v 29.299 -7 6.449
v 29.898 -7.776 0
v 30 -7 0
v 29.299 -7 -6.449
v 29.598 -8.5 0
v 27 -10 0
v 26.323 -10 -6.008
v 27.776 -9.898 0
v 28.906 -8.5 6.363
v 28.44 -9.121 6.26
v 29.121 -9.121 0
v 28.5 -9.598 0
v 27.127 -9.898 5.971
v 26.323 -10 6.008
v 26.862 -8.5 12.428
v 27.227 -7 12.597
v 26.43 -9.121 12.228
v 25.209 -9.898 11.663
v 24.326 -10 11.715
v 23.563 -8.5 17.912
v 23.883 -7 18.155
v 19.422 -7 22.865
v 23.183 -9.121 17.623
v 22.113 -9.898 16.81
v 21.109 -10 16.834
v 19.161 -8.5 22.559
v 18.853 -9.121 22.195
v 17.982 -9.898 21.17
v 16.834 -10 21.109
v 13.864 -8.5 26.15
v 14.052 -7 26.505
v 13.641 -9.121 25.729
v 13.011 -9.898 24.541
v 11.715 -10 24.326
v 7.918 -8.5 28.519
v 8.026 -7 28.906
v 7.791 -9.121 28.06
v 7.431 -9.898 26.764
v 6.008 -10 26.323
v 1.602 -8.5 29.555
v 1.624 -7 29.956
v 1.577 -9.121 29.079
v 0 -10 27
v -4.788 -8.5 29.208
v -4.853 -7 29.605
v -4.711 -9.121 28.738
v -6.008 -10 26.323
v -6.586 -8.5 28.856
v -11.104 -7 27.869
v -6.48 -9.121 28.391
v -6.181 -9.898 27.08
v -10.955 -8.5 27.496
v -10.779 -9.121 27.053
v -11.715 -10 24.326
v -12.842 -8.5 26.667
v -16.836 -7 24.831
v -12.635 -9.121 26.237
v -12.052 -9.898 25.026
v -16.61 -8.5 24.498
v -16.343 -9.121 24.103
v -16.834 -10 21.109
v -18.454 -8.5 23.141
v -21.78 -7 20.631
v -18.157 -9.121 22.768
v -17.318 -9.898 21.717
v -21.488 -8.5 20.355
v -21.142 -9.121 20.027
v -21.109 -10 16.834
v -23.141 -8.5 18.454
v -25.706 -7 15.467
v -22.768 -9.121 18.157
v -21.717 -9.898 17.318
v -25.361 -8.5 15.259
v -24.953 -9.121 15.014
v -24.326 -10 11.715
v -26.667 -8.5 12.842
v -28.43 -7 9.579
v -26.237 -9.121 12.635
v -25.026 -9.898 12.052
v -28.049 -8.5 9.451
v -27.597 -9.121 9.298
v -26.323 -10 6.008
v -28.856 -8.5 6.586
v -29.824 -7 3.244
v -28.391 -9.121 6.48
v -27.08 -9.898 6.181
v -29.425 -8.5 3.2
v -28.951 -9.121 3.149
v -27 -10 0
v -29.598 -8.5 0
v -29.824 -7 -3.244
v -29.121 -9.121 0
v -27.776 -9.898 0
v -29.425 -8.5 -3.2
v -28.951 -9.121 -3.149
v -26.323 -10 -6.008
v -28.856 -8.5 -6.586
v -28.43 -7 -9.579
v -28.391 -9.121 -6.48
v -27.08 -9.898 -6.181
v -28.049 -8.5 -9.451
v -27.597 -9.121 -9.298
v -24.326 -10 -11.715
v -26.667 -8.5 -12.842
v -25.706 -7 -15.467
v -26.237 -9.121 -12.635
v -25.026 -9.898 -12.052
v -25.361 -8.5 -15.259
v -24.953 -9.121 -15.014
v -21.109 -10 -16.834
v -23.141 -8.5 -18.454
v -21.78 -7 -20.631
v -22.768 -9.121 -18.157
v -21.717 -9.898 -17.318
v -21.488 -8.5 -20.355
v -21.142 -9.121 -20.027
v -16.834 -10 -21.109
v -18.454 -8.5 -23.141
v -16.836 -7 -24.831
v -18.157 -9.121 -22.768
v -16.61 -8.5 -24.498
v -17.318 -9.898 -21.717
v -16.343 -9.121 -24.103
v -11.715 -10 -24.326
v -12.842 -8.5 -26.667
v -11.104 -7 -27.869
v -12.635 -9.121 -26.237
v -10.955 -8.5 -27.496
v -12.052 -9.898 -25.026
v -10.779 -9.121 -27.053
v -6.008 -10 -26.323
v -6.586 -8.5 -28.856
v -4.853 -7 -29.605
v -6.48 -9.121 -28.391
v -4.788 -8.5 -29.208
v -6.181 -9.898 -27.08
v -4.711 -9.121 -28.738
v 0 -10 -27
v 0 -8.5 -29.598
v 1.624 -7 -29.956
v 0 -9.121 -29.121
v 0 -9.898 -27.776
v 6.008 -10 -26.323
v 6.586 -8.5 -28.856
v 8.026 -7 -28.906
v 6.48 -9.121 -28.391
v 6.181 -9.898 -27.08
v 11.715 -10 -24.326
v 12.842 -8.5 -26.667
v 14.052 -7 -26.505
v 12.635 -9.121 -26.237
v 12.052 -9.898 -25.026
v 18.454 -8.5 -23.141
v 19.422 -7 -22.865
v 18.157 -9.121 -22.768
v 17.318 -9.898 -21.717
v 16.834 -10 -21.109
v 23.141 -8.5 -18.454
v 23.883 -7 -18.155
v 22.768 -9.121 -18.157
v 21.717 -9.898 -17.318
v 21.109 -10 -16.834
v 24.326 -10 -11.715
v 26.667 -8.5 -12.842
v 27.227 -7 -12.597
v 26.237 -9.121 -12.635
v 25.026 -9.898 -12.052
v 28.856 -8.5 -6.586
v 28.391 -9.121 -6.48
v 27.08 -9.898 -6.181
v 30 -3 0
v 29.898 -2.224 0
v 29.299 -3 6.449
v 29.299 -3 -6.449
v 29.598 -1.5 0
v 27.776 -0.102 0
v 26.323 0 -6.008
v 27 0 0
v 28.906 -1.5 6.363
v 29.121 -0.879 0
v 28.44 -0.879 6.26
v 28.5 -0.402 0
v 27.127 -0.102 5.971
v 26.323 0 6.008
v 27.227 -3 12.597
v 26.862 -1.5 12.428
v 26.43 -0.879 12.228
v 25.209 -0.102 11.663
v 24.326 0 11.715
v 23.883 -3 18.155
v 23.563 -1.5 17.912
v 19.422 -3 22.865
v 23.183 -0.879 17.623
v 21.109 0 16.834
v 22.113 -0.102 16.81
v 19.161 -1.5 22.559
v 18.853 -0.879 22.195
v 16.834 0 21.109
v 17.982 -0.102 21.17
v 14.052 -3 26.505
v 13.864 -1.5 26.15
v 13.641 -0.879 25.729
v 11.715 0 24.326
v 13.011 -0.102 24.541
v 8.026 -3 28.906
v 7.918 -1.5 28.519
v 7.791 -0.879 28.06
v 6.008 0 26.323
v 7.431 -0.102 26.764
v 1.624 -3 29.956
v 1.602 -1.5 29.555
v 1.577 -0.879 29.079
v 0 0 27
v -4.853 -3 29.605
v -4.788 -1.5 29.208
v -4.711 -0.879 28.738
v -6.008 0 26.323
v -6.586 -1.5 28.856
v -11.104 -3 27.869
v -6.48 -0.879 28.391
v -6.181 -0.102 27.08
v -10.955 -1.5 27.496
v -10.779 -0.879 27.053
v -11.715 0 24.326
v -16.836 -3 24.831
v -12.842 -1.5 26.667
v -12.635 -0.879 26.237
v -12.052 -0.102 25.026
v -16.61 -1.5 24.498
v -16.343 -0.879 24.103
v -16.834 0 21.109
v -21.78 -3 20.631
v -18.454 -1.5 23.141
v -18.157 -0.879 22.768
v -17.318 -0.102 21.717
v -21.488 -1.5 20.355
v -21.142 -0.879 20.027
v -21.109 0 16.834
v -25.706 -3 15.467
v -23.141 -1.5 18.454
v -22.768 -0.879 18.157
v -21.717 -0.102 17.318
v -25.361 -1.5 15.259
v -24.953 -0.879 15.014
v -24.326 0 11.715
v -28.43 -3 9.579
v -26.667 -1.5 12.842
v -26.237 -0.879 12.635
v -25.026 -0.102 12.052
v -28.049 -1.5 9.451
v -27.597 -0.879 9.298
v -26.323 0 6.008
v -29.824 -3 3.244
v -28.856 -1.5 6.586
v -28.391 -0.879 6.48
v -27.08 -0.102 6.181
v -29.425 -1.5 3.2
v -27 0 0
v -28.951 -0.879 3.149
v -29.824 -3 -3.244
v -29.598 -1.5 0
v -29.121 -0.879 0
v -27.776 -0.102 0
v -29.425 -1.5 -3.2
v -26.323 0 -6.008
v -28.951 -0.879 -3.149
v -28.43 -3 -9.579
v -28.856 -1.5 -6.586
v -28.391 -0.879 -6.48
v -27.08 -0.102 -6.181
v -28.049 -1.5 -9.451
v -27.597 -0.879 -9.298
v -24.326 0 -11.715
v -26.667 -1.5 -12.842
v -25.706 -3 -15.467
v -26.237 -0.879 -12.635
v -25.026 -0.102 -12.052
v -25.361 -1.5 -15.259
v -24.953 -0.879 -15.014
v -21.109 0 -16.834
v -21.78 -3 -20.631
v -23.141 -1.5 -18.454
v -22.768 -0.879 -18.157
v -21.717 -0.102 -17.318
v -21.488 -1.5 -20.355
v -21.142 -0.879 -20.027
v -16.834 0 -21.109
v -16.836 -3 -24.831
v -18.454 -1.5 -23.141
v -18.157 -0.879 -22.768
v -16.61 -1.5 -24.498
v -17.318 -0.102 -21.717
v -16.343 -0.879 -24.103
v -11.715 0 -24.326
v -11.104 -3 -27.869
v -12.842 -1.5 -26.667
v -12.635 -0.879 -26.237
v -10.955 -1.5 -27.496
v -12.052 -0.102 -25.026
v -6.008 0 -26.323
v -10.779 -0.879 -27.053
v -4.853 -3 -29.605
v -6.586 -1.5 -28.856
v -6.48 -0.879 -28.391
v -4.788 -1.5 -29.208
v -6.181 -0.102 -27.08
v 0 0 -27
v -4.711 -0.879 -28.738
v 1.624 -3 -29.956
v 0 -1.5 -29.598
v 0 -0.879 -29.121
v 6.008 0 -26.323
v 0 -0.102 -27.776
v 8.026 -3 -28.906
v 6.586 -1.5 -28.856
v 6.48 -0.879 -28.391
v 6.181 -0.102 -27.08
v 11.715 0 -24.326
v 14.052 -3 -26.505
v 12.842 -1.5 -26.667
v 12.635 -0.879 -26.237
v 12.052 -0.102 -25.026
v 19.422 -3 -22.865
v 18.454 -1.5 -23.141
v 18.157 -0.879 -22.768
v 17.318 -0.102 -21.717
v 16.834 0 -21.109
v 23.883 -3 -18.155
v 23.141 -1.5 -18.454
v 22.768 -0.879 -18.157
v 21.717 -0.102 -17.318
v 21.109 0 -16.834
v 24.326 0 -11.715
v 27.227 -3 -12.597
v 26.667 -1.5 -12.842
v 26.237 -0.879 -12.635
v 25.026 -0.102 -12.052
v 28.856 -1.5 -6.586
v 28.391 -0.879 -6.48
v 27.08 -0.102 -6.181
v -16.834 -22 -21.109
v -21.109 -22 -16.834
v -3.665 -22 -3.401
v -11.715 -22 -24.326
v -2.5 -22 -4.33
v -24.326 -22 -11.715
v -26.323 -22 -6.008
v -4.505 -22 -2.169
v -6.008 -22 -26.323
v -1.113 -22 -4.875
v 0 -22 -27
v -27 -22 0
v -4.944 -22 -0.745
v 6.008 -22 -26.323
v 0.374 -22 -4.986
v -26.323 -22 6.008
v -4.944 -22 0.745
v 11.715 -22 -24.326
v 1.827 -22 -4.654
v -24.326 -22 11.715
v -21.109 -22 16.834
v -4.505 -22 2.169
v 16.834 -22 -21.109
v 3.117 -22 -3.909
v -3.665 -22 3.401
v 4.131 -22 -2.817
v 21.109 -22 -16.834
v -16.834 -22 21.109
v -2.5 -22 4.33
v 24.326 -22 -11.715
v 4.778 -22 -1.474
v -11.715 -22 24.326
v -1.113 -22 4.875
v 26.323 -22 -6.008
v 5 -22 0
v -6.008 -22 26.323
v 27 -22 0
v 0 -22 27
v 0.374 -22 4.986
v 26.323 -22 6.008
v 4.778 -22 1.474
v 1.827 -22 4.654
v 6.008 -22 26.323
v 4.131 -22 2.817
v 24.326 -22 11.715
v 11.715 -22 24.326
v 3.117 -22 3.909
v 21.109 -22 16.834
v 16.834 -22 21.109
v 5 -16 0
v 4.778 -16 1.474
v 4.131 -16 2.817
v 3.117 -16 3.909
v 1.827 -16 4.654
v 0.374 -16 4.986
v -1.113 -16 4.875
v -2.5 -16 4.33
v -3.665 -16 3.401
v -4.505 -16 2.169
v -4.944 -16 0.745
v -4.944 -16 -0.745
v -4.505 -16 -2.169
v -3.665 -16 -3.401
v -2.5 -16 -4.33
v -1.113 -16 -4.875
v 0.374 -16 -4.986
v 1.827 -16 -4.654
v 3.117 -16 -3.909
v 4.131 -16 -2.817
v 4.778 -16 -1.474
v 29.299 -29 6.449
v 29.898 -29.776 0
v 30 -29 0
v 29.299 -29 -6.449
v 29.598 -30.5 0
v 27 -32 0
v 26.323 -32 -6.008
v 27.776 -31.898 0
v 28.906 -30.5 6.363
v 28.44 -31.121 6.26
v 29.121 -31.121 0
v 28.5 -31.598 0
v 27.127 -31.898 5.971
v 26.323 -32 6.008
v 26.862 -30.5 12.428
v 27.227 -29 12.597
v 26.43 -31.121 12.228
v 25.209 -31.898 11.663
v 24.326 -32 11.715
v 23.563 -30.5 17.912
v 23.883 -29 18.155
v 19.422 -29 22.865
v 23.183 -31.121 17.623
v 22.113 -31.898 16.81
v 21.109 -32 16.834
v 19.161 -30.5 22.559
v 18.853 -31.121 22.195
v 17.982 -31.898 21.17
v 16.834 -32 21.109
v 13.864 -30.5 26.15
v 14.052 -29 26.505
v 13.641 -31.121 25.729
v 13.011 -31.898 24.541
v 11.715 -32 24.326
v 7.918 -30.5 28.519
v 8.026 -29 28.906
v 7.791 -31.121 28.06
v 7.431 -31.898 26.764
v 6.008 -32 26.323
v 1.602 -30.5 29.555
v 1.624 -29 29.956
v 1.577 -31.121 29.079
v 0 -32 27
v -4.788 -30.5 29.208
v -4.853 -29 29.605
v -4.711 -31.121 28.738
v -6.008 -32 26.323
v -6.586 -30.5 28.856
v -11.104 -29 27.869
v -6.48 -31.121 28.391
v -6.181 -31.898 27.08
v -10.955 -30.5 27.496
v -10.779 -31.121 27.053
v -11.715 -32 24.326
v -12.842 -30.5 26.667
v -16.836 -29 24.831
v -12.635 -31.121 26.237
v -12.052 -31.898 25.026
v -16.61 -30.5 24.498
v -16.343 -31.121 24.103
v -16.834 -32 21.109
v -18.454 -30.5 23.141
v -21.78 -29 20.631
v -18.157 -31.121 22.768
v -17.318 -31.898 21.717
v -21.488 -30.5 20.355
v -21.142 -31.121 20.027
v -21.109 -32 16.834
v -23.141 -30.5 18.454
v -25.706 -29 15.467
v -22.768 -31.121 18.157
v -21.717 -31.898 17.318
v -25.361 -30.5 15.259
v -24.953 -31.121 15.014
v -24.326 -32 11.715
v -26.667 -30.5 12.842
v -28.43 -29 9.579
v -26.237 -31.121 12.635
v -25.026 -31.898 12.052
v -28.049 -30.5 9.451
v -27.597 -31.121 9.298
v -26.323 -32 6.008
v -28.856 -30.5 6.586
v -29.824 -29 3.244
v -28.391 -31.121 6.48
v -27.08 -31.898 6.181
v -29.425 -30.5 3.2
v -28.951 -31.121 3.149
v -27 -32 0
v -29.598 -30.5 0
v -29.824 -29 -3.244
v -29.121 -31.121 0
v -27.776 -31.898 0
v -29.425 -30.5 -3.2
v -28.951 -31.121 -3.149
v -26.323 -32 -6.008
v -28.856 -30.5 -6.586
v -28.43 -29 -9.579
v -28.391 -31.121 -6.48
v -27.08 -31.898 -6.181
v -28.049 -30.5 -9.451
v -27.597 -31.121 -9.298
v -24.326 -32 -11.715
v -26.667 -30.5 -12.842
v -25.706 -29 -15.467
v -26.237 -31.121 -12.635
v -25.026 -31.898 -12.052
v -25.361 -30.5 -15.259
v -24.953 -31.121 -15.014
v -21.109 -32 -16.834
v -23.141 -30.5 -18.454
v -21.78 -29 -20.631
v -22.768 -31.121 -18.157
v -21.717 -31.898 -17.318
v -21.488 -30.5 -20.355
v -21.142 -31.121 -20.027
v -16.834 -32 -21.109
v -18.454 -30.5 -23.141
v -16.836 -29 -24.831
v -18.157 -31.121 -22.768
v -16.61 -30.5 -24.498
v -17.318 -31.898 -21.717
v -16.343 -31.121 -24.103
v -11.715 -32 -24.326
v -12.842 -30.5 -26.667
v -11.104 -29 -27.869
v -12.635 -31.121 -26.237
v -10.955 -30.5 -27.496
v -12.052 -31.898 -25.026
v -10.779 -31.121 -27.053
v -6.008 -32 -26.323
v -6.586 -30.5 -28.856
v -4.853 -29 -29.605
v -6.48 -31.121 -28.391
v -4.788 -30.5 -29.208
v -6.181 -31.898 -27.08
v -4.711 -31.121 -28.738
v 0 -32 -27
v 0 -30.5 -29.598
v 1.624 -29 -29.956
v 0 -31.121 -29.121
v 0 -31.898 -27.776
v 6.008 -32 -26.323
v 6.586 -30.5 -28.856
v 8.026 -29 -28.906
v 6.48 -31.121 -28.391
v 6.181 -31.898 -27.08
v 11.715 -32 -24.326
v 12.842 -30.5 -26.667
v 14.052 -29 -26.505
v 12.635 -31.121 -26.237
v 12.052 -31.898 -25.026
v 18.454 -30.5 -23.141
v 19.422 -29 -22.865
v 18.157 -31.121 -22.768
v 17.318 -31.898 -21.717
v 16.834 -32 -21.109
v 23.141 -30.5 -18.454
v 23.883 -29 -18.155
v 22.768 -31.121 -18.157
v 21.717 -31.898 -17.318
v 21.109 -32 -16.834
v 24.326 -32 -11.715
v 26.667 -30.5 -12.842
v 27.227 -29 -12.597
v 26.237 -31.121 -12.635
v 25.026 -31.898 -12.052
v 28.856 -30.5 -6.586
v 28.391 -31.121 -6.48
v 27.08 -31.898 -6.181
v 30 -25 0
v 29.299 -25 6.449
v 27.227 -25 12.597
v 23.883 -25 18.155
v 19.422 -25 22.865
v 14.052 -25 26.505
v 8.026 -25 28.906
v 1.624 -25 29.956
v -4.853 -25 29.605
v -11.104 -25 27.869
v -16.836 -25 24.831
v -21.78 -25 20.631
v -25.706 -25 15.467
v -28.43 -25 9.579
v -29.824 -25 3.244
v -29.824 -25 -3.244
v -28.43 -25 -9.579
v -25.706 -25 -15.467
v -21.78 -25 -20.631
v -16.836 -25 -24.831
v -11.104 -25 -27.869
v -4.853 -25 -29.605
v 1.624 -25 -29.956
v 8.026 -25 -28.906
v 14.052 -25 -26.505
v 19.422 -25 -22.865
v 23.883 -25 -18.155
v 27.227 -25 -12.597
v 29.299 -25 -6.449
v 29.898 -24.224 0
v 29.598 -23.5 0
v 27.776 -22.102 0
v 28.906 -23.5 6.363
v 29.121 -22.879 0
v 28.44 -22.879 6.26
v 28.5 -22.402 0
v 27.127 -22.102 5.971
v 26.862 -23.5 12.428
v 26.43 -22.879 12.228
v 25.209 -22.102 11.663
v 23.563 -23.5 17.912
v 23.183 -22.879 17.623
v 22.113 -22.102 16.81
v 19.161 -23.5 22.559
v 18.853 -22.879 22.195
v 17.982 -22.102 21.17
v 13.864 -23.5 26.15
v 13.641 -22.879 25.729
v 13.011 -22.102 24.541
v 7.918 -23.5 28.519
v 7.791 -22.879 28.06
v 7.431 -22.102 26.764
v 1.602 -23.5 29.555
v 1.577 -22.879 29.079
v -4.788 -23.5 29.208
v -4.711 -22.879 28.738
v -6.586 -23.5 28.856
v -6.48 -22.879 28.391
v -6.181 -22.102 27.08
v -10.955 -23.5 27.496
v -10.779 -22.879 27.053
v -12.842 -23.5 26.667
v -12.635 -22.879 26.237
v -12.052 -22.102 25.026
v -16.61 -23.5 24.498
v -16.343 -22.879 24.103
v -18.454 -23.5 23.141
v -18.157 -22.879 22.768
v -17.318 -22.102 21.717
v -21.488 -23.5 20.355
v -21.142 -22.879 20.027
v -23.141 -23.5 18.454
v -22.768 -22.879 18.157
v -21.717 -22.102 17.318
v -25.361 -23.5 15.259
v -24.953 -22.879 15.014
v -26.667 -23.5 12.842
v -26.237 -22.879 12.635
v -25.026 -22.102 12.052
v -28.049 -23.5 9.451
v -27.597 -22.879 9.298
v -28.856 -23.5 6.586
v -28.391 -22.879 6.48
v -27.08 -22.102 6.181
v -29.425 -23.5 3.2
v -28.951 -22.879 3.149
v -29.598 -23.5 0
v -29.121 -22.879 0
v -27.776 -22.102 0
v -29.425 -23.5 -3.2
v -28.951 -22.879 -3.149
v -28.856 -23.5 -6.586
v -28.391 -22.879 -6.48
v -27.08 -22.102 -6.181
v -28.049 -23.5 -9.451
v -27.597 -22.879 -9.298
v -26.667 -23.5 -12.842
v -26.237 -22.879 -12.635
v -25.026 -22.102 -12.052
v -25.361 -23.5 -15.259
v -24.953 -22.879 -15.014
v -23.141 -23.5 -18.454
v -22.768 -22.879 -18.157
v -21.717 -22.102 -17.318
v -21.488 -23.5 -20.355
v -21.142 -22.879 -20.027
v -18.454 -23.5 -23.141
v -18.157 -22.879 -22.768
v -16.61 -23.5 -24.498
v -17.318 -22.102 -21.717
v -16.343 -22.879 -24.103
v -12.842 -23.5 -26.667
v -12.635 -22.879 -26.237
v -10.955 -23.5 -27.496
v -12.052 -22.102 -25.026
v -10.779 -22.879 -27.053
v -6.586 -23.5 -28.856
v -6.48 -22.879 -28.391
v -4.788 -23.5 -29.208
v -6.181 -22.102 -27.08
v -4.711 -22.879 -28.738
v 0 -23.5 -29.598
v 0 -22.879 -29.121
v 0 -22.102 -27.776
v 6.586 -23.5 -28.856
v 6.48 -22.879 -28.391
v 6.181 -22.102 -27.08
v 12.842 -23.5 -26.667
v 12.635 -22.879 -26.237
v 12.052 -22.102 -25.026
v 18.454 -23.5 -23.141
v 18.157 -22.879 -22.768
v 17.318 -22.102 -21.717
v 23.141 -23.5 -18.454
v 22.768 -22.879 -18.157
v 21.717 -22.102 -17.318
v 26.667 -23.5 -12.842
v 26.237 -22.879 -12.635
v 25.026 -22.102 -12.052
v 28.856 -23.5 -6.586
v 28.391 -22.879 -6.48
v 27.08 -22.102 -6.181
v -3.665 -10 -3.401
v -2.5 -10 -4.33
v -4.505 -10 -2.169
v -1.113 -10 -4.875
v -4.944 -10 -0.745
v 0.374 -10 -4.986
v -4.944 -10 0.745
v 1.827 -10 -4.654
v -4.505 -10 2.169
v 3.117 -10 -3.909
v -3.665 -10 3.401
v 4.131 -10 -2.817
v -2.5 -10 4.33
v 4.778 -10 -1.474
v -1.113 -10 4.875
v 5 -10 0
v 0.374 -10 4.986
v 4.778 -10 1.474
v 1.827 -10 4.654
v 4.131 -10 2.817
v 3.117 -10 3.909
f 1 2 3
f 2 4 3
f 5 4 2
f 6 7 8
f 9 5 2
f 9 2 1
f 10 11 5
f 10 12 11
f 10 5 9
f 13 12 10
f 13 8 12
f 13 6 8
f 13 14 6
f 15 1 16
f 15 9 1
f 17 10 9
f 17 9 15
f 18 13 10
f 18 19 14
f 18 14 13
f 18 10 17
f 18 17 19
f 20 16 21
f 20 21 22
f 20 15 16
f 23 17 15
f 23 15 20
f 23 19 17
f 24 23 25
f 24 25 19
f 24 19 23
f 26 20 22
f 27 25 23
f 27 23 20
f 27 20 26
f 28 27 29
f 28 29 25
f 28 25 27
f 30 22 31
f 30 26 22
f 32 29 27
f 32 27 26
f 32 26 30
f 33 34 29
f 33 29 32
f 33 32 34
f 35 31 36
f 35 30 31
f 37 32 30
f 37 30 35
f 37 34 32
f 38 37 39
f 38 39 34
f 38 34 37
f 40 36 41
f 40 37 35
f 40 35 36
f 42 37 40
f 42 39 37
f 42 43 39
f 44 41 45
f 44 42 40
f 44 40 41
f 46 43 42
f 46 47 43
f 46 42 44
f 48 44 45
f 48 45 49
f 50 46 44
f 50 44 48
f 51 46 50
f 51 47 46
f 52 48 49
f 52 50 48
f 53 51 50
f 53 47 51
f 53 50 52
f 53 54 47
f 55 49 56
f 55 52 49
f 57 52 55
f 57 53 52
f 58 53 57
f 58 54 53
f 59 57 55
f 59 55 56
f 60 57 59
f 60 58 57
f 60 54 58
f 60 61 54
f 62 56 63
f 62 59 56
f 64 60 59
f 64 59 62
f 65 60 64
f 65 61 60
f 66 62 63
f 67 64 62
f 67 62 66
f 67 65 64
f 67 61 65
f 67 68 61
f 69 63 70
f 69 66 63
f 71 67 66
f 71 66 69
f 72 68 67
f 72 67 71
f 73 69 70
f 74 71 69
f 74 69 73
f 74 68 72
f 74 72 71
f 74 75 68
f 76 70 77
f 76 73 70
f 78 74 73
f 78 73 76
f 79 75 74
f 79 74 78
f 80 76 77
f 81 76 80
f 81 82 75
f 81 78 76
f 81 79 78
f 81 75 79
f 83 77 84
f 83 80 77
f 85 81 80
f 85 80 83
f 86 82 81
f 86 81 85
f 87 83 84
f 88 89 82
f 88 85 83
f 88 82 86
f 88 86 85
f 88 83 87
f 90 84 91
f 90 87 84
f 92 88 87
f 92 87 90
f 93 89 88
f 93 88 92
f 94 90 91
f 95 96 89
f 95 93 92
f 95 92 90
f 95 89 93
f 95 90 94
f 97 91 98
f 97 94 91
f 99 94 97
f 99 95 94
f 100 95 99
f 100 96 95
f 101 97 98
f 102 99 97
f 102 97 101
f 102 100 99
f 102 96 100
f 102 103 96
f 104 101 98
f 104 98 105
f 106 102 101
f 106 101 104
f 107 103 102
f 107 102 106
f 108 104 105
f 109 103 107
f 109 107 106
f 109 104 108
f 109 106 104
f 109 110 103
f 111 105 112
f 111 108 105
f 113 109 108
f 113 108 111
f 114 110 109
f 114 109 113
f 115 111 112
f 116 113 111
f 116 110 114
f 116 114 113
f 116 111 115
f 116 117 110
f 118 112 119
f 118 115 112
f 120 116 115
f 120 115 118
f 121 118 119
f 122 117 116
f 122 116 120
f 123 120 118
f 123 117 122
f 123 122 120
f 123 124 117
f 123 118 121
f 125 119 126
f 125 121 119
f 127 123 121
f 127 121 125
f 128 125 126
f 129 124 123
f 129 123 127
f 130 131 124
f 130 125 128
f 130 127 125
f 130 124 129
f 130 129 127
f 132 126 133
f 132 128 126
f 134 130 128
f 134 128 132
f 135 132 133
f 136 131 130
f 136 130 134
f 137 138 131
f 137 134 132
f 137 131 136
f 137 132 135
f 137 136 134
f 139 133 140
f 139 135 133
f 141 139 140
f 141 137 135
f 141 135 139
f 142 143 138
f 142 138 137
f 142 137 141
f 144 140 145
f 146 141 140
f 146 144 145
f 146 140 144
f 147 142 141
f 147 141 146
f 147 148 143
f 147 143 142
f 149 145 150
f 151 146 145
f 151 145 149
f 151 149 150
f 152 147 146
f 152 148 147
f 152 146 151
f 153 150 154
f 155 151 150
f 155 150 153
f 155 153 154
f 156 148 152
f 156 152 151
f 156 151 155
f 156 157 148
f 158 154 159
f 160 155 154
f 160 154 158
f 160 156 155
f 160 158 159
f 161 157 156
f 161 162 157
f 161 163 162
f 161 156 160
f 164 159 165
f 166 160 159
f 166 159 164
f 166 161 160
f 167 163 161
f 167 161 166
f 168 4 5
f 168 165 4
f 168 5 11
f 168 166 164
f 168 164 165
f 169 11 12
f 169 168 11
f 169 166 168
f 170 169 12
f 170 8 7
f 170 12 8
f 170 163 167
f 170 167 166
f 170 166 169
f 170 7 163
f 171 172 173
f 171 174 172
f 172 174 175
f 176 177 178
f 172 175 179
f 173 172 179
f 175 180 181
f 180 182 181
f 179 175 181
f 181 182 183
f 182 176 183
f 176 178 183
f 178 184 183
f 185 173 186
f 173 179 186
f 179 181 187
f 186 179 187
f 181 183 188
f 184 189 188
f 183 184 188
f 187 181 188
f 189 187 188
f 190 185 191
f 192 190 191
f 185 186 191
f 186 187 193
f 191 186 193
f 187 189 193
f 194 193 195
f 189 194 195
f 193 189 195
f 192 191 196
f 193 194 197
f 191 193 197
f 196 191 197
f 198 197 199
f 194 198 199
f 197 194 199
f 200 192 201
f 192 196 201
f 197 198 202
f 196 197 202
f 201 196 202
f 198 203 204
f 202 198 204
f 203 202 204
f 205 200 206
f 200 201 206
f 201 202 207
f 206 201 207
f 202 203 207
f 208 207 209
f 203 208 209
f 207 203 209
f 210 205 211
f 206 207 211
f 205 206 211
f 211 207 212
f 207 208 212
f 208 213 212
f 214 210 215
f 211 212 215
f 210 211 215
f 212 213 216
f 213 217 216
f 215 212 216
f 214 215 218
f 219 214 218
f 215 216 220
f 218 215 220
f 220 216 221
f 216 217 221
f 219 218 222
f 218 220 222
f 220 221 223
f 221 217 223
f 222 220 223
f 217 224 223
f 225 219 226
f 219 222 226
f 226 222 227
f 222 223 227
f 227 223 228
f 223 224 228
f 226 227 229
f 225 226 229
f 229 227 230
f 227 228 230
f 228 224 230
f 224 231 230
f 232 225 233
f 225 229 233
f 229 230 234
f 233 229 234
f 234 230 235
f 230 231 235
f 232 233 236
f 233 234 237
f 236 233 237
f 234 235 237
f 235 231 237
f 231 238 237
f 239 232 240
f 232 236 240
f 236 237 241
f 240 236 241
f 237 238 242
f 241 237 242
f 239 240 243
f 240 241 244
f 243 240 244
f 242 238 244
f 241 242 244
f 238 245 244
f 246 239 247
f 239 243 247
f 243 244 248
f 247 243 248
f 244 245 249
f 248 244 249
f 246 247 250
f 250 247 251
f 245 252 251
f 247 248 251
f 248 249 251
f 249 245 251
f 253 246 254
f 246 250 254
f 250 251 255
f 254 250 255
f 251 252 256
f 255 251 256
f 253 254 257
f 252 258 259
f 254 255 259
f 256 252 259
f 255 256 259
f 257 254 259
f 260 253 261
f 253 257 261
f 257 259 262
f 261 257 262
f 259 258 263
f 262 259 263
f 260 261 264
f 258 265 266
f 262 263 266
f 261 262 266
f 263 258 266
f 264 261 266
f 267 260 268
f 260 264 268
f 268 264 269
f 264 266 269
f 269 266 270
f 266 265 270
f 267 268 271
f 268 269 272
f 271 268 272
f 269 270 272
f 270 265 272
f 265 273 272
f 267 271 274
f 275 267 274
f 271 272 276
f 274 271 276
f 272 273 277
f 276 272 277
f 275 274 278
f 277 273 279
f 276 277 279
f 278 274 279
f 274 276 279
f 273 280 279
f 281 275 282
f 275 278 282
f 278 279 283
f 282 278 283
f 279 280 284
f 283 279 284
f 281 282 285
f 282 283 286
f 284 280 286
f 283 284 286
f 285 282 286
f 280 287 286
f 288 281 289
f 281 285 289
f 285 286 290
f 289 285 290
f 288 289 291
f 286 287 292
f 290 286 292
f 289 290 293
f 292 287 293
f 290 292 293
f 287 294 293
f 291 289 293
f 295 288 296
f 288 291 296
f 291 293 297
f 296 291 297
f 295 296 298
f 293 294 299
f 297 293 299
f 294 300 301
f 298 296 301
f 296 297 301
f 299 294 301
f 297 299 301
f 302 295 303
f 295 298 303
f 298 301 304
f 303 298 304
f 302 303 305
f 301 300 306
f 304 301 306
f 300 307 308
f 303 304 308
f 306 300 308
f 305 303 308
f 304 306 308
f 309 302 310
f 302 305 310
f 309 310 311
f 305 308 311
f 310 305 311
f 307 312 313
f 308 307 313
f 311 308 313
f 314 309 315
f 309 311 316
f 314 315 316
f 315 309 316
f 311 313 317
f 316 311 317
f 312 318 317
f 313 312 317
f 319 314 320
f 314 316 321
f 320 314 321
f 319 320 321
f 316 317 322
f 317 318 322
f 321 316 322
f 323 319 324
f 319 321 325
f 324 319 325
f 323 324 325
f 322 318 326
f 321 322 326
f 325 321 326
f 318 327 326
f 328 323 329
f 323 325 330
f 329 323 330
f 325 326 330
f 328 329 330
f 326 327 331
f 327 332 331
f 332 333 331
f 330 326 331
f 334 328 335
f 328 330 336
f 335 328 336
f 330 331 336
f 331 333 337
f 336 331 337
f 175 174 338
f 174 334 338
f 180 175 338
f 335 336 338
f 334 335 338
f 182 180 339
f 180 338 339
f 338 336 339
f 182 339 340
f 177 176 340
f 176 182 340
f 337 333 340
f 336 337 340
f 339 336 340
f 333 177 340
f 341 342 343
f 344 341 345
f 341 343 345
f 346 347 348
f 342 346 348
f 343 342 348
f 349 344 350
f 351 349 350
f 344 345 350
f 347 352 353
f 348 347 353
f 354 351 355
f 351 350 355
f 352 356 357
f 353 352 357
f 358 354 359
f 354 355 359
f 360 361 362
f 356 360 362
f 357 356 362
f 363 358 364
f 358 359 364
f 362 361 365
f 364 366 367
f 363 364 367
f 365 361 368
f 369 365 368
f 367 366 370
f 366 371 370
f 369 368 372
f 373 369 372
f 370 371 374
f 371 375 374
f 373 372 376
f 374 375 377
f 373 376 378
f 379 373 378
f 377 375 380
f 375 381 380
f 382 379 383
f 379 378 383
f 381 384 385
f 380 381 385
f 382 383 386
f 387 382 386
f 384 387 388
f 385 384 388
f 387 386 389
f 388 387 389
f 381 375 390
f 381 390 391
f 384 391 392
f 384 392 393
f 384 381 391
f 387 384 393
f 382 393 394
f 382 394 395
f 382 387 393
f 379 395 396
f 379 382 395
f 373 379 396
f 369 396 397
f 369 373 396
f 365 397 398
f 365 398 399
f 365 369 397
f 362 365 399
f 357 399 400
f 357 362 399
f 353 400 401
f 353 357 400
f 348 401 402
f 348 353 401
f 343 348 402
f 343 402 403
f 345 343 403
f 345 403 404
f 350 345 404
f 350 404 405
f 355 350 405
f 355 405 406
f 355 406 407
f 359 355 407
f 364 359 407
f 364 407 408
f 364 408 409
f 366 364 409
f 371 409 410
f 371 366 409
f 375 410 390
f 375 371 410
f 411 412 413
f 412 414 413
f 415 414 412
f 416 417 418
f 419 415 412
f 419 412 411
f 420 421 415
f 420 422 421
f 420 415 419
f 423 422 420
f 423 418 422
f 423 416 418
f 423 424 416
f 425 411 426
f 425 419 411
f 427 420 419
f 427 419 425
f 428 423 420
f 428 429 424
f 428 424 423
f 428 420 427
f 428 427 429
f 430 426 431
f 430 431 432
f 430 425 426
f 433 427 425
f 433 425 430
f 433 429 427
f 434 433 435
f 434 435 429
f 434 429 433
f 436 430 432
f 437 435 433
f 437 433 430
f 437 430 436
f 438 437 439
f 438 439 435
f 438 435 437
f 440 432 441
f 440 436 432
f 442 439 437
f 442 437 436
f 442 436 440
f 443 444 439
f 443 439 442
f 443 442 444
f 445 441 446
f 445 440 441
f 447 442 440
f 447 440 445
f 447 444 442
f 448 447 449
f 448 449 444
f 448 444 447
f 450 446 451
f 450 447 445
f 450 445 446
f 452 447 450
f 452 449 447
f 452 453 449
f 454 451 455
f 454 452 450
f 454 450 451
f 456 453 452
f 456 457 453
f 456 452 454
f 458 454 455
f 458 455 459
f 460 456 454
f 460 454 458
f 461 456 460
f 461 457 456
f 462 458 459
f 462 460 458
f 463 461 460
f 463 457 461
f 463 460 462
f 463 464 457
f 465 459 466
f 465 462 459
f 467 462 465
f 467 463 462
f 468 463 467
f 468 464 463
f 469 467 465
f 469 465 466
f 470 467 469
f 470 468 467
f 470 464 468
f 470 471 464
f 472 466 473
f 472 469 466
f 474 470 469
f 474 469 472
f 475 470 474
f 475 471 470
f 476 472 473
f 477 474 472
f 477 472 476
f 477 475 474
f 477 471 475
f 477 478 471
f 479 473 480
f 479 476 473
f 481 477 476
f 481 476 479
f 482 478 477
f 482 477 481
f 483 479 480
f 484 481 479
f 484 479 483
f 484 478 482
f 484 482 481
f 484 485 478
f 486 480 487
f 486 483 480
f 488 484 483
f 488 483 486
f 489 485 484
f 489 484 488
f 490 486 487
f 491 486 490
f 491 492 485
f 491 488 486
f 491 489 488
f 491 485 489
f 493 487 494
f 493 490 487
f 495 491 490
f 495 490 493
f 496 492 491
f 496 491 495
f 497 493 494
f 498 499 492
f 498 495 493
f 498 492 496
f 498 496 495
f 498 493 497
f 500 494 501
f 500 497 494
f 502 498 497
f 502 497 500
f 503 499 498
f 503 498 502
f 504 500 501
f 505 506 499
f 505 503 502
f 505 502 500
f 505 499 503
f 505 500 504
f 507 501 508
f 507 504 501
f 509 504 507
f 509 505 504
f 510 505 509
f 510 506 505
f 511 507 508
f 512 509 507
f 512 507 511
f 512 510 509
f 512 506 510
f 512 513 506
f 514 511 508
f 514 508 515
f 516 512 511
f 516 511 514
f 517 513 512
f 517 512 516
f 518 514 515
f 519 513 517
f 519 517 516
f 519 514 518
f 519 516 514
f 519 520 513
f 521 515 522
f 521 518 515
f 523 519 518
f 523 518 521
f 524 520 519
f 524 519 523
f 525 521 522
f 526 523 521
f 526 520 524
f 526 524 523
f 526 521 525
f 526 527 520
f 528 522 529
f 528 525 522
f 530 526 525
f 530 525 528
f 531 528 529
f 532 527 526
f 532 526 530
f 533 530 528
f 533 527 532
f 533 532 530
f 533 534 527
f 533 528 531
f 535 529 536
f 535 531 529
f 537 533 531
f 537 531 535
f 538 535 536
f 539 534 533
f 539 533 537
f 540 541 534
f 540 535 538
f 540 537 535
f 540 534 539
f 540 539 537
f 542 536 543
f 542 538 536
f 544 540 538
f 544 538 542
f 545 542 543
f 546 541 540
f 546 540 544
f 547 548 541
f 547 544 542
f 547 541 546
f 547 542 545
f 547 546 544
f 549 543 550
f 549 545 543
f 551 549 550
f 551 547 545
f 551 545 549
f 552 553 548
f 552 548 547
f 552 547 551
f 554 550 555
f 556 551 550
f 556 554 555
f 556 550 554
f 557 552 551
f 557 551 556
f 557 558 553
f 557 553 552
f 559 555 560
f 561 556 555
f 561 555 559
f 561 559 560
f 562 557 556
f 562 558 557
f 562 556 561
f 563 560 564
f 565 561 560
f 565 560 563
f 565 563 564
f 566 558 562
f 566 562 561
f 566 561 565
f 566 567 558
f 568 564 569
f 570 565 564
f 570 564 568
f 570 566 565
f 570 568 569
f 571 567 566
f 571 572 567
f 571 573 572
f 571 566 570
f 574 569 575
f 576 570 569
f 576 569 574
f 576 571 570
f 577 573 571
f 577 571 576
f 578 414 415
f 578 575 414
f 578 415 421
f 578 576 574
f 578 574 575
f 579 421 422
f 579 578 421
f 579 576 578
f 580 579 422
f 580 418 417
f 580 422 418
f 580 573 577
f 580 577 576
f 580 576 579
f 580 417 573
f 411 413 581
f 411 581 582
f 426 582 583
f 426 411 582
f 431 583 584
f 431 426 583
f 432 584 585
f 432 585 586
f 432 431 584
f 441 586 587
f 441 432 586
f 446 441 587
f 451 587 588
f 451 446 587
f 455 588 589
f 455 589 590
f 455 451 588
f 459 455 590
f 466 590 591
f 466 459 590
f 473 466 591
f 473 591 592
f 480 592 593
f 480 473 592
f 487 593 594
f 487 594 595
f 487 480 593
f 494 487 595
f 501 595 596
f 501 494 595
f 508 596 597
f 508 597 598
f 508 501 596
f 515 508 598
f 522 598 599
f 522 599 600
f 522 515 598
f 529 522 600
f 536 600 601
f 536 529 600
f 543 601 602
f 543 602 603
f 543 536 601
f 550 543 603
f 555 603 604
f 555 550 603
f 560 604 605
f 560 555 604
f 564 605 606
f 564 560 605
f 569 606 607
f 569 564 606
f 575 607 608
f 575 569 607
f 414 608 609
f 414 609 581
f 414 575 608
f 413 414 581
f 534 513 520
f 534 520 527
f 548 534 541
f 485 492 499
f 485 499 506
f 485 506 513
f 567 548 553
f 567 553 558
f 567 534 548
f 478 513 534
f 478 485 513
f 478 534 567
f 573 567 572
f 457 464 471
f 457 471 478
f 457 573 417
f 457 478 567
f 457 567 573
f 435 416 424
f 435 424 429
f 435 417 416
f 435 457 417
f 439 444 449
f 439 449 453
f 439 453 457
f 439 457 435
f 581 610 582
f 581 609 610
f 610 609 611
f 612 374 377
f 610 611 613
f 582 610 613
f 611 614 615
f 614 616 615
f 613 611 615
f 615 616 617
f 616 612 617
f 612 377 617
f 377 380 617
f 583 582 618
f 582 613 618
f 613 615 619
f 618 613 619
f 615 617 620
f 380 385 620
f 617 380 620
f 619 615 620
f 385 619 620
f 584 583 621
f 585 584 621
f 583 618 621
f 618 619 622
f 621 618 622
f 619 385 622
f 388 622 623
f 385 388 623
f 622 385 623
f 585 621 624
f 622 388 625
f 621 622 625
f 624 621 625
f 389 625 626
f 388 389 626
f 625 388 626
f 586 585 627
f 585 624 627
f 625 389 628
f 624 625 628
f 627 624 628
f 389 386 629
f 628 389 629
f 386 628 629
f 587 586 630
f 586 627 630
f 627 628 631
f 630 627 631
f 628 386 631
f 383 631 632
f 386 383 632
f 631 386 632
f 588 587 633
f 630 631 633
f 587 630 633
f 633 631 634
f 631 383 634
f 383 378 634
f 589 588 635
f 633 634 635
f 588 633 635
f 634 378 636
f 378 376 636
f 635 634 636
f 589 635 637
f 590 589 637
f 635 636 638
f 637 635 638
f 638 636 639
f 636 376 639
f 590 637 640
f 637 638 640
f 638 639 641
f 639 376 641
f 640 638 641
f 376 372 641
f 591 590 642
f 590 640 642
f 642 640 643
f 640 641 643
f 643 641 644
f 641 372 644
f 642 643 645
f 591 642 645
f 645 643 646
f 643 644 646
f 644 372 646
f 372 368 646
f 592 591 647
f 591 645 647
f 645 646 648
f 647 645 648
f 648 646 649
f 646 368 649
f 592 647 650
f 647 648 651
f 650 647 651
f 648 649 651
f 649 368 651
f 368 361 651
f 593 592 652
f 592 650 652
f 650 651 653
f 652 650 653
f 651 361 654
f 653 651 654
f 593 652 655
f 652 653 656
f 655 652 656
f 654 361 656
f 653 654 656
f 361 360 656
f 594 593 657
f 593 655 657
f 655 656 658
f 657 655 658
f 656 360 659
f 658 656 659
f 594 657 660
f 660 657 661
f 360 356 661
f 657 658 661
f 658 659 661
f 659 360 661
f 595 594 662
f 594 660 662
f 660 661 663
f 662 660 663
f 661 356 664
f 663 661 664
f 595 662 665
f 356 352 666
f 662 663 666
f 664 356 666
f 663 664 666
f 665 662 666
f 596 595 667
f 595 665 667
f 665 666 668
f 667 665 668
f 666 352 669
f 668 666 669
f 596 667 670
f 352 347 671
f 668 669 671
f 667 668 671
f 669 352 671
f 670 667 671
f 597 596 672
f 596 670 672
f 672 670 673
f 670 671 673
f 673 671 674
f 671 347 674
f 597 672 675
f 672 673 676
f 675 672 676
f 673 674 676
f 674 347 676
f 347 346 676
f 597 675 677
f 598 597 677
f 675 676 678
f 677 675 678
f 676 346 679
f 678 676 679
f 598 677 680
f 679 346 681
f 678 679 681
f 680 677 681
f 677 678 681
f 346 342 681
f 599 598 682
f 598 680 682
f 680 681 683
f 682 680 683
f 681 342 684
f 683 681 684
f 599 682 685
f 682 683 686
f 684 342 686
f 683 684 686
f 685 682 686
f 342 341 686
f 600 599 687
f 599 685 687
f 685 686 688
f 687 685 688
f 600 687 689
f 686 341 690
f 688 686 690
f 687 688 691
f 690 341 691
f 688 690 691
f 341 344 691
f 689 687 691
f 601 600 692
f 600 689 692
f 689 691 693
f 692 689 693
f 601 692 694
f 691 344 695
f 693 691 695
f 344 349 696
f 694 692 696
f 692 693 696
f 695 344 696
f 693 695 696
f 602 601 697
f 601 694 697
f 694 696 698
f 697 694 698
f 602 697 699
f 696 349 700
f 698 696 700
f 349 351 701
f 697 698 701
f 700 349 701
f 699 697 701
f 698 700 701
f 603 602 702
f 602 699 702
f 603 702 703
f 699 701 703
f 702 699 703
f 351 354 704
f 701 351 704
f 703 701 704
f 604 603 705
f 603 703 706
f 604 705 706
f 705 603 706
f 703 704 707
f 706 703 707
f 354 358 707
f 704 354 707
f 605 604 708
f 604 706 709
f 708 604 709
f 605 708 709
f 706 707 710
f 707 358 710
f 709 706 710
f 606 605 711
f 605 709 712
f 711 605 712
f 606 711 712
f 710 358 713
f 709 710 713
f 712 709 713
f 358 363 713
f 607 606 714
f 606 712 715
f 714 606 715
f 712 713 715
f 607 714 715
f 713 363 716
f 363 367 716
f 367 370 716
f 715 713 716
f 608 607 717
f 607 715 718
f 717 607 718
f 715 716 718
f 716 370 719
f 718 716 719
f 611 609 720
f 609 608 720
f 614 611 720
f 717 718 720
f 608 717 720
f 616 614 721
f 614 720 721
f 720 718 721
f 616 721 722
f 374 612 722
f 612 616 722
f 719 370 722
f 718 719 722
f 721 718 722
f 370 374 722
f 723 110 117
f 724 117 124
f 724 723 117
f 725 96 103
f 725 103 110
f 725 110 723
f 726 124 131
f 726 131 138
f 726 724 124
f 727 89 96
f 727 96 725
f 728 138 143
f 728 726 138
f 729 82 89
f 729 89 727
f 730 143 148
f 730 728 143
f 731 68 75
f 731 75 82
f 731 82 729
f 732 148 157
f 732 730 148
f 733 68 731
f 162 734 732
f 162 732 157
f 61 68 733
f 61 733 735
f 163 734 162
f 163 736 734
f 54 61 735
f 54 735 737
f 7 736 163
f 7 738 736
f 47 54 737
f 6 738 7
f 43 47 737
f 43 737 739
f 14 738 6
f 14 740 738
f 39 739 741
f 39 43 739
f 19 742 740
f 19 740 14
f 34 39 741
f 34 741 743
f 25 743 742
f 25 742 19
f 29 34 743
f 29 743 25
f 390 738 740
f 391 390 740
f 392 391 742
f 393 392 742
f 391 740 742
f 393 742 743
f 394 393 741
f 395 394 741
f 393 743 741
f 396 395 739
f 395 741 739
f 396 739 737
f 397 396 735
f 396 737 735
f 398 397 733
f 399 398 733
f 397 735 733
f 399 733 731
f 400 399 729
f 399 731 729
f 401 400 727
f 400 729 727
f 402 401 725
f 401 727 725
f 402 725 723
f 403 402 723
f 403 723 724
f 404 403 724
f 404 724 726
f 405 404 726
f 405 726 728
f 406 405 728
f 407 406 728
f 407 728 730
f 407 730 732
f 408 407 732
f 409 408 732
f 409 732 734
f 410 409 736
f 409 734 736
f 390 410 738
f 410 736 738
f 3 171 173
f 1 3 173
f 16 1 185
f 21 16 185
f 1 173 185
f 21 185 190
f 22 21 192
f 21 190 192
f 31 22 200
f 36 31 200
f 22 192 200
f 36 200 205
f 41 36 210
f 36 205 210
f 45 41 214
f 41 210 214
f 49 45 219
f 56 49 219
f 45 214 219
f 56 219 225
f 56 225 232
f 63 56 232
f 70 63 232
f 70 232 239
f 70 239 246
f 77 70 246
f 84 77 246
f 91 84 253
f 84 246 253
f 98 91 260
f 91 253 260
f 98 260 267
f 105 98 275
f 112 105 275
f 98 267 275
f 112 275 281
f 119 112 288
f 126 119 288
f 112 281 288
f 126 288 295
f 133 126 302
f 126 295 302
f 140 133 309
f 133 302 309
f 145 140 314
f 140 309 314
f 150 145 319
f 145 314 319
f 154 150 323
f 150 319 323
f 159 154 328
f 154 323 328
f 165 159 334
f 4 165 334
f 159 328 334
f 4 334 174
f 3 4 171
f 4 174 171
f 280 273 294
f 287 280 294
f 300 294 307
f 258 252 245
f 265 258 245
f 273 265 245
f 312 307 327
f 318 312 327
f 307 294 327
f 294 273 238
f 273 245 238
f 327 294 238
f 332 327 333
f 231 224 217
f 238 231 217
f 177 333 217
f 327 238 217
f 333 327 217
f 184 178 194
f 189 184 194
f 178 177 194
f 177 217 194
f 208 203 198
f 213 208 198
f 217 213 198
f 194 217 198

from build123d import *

# Parameters (mm, degrees)
F0_R     = 30
F1_DEPTH = 10
F2_R     = 3
F3_R     = 5
F4_DEPTH = 6


with BuildPart() as f1:
    # F0 (on Front) → F1 (new body)
    with BuildSketch(Plane.XZ):
        Circle(F0_R)
    extrude(amount=F1_DEPTH)

    # F2
    f2_edges = [f1.edges().sort_by_distance(p)[0] for p in [
        (-30, -10, 0),
        (-30, 0, 0),
    ]]
    fillet(f2_edges, radius=F2_R)

    # F3 (on face) → F4 (join)
    with BuildSketch(Plane.XZ.offset(10)):
        Circle(F3_R)
    extrude(amount=F4_DEPTH)

    # F5: F1 across face


with BuildPart() as f1_1:
    add(f1.part)
    add(f1.part.mirror(Plane.XZ.offset(16)))


solid = f1_1.part
